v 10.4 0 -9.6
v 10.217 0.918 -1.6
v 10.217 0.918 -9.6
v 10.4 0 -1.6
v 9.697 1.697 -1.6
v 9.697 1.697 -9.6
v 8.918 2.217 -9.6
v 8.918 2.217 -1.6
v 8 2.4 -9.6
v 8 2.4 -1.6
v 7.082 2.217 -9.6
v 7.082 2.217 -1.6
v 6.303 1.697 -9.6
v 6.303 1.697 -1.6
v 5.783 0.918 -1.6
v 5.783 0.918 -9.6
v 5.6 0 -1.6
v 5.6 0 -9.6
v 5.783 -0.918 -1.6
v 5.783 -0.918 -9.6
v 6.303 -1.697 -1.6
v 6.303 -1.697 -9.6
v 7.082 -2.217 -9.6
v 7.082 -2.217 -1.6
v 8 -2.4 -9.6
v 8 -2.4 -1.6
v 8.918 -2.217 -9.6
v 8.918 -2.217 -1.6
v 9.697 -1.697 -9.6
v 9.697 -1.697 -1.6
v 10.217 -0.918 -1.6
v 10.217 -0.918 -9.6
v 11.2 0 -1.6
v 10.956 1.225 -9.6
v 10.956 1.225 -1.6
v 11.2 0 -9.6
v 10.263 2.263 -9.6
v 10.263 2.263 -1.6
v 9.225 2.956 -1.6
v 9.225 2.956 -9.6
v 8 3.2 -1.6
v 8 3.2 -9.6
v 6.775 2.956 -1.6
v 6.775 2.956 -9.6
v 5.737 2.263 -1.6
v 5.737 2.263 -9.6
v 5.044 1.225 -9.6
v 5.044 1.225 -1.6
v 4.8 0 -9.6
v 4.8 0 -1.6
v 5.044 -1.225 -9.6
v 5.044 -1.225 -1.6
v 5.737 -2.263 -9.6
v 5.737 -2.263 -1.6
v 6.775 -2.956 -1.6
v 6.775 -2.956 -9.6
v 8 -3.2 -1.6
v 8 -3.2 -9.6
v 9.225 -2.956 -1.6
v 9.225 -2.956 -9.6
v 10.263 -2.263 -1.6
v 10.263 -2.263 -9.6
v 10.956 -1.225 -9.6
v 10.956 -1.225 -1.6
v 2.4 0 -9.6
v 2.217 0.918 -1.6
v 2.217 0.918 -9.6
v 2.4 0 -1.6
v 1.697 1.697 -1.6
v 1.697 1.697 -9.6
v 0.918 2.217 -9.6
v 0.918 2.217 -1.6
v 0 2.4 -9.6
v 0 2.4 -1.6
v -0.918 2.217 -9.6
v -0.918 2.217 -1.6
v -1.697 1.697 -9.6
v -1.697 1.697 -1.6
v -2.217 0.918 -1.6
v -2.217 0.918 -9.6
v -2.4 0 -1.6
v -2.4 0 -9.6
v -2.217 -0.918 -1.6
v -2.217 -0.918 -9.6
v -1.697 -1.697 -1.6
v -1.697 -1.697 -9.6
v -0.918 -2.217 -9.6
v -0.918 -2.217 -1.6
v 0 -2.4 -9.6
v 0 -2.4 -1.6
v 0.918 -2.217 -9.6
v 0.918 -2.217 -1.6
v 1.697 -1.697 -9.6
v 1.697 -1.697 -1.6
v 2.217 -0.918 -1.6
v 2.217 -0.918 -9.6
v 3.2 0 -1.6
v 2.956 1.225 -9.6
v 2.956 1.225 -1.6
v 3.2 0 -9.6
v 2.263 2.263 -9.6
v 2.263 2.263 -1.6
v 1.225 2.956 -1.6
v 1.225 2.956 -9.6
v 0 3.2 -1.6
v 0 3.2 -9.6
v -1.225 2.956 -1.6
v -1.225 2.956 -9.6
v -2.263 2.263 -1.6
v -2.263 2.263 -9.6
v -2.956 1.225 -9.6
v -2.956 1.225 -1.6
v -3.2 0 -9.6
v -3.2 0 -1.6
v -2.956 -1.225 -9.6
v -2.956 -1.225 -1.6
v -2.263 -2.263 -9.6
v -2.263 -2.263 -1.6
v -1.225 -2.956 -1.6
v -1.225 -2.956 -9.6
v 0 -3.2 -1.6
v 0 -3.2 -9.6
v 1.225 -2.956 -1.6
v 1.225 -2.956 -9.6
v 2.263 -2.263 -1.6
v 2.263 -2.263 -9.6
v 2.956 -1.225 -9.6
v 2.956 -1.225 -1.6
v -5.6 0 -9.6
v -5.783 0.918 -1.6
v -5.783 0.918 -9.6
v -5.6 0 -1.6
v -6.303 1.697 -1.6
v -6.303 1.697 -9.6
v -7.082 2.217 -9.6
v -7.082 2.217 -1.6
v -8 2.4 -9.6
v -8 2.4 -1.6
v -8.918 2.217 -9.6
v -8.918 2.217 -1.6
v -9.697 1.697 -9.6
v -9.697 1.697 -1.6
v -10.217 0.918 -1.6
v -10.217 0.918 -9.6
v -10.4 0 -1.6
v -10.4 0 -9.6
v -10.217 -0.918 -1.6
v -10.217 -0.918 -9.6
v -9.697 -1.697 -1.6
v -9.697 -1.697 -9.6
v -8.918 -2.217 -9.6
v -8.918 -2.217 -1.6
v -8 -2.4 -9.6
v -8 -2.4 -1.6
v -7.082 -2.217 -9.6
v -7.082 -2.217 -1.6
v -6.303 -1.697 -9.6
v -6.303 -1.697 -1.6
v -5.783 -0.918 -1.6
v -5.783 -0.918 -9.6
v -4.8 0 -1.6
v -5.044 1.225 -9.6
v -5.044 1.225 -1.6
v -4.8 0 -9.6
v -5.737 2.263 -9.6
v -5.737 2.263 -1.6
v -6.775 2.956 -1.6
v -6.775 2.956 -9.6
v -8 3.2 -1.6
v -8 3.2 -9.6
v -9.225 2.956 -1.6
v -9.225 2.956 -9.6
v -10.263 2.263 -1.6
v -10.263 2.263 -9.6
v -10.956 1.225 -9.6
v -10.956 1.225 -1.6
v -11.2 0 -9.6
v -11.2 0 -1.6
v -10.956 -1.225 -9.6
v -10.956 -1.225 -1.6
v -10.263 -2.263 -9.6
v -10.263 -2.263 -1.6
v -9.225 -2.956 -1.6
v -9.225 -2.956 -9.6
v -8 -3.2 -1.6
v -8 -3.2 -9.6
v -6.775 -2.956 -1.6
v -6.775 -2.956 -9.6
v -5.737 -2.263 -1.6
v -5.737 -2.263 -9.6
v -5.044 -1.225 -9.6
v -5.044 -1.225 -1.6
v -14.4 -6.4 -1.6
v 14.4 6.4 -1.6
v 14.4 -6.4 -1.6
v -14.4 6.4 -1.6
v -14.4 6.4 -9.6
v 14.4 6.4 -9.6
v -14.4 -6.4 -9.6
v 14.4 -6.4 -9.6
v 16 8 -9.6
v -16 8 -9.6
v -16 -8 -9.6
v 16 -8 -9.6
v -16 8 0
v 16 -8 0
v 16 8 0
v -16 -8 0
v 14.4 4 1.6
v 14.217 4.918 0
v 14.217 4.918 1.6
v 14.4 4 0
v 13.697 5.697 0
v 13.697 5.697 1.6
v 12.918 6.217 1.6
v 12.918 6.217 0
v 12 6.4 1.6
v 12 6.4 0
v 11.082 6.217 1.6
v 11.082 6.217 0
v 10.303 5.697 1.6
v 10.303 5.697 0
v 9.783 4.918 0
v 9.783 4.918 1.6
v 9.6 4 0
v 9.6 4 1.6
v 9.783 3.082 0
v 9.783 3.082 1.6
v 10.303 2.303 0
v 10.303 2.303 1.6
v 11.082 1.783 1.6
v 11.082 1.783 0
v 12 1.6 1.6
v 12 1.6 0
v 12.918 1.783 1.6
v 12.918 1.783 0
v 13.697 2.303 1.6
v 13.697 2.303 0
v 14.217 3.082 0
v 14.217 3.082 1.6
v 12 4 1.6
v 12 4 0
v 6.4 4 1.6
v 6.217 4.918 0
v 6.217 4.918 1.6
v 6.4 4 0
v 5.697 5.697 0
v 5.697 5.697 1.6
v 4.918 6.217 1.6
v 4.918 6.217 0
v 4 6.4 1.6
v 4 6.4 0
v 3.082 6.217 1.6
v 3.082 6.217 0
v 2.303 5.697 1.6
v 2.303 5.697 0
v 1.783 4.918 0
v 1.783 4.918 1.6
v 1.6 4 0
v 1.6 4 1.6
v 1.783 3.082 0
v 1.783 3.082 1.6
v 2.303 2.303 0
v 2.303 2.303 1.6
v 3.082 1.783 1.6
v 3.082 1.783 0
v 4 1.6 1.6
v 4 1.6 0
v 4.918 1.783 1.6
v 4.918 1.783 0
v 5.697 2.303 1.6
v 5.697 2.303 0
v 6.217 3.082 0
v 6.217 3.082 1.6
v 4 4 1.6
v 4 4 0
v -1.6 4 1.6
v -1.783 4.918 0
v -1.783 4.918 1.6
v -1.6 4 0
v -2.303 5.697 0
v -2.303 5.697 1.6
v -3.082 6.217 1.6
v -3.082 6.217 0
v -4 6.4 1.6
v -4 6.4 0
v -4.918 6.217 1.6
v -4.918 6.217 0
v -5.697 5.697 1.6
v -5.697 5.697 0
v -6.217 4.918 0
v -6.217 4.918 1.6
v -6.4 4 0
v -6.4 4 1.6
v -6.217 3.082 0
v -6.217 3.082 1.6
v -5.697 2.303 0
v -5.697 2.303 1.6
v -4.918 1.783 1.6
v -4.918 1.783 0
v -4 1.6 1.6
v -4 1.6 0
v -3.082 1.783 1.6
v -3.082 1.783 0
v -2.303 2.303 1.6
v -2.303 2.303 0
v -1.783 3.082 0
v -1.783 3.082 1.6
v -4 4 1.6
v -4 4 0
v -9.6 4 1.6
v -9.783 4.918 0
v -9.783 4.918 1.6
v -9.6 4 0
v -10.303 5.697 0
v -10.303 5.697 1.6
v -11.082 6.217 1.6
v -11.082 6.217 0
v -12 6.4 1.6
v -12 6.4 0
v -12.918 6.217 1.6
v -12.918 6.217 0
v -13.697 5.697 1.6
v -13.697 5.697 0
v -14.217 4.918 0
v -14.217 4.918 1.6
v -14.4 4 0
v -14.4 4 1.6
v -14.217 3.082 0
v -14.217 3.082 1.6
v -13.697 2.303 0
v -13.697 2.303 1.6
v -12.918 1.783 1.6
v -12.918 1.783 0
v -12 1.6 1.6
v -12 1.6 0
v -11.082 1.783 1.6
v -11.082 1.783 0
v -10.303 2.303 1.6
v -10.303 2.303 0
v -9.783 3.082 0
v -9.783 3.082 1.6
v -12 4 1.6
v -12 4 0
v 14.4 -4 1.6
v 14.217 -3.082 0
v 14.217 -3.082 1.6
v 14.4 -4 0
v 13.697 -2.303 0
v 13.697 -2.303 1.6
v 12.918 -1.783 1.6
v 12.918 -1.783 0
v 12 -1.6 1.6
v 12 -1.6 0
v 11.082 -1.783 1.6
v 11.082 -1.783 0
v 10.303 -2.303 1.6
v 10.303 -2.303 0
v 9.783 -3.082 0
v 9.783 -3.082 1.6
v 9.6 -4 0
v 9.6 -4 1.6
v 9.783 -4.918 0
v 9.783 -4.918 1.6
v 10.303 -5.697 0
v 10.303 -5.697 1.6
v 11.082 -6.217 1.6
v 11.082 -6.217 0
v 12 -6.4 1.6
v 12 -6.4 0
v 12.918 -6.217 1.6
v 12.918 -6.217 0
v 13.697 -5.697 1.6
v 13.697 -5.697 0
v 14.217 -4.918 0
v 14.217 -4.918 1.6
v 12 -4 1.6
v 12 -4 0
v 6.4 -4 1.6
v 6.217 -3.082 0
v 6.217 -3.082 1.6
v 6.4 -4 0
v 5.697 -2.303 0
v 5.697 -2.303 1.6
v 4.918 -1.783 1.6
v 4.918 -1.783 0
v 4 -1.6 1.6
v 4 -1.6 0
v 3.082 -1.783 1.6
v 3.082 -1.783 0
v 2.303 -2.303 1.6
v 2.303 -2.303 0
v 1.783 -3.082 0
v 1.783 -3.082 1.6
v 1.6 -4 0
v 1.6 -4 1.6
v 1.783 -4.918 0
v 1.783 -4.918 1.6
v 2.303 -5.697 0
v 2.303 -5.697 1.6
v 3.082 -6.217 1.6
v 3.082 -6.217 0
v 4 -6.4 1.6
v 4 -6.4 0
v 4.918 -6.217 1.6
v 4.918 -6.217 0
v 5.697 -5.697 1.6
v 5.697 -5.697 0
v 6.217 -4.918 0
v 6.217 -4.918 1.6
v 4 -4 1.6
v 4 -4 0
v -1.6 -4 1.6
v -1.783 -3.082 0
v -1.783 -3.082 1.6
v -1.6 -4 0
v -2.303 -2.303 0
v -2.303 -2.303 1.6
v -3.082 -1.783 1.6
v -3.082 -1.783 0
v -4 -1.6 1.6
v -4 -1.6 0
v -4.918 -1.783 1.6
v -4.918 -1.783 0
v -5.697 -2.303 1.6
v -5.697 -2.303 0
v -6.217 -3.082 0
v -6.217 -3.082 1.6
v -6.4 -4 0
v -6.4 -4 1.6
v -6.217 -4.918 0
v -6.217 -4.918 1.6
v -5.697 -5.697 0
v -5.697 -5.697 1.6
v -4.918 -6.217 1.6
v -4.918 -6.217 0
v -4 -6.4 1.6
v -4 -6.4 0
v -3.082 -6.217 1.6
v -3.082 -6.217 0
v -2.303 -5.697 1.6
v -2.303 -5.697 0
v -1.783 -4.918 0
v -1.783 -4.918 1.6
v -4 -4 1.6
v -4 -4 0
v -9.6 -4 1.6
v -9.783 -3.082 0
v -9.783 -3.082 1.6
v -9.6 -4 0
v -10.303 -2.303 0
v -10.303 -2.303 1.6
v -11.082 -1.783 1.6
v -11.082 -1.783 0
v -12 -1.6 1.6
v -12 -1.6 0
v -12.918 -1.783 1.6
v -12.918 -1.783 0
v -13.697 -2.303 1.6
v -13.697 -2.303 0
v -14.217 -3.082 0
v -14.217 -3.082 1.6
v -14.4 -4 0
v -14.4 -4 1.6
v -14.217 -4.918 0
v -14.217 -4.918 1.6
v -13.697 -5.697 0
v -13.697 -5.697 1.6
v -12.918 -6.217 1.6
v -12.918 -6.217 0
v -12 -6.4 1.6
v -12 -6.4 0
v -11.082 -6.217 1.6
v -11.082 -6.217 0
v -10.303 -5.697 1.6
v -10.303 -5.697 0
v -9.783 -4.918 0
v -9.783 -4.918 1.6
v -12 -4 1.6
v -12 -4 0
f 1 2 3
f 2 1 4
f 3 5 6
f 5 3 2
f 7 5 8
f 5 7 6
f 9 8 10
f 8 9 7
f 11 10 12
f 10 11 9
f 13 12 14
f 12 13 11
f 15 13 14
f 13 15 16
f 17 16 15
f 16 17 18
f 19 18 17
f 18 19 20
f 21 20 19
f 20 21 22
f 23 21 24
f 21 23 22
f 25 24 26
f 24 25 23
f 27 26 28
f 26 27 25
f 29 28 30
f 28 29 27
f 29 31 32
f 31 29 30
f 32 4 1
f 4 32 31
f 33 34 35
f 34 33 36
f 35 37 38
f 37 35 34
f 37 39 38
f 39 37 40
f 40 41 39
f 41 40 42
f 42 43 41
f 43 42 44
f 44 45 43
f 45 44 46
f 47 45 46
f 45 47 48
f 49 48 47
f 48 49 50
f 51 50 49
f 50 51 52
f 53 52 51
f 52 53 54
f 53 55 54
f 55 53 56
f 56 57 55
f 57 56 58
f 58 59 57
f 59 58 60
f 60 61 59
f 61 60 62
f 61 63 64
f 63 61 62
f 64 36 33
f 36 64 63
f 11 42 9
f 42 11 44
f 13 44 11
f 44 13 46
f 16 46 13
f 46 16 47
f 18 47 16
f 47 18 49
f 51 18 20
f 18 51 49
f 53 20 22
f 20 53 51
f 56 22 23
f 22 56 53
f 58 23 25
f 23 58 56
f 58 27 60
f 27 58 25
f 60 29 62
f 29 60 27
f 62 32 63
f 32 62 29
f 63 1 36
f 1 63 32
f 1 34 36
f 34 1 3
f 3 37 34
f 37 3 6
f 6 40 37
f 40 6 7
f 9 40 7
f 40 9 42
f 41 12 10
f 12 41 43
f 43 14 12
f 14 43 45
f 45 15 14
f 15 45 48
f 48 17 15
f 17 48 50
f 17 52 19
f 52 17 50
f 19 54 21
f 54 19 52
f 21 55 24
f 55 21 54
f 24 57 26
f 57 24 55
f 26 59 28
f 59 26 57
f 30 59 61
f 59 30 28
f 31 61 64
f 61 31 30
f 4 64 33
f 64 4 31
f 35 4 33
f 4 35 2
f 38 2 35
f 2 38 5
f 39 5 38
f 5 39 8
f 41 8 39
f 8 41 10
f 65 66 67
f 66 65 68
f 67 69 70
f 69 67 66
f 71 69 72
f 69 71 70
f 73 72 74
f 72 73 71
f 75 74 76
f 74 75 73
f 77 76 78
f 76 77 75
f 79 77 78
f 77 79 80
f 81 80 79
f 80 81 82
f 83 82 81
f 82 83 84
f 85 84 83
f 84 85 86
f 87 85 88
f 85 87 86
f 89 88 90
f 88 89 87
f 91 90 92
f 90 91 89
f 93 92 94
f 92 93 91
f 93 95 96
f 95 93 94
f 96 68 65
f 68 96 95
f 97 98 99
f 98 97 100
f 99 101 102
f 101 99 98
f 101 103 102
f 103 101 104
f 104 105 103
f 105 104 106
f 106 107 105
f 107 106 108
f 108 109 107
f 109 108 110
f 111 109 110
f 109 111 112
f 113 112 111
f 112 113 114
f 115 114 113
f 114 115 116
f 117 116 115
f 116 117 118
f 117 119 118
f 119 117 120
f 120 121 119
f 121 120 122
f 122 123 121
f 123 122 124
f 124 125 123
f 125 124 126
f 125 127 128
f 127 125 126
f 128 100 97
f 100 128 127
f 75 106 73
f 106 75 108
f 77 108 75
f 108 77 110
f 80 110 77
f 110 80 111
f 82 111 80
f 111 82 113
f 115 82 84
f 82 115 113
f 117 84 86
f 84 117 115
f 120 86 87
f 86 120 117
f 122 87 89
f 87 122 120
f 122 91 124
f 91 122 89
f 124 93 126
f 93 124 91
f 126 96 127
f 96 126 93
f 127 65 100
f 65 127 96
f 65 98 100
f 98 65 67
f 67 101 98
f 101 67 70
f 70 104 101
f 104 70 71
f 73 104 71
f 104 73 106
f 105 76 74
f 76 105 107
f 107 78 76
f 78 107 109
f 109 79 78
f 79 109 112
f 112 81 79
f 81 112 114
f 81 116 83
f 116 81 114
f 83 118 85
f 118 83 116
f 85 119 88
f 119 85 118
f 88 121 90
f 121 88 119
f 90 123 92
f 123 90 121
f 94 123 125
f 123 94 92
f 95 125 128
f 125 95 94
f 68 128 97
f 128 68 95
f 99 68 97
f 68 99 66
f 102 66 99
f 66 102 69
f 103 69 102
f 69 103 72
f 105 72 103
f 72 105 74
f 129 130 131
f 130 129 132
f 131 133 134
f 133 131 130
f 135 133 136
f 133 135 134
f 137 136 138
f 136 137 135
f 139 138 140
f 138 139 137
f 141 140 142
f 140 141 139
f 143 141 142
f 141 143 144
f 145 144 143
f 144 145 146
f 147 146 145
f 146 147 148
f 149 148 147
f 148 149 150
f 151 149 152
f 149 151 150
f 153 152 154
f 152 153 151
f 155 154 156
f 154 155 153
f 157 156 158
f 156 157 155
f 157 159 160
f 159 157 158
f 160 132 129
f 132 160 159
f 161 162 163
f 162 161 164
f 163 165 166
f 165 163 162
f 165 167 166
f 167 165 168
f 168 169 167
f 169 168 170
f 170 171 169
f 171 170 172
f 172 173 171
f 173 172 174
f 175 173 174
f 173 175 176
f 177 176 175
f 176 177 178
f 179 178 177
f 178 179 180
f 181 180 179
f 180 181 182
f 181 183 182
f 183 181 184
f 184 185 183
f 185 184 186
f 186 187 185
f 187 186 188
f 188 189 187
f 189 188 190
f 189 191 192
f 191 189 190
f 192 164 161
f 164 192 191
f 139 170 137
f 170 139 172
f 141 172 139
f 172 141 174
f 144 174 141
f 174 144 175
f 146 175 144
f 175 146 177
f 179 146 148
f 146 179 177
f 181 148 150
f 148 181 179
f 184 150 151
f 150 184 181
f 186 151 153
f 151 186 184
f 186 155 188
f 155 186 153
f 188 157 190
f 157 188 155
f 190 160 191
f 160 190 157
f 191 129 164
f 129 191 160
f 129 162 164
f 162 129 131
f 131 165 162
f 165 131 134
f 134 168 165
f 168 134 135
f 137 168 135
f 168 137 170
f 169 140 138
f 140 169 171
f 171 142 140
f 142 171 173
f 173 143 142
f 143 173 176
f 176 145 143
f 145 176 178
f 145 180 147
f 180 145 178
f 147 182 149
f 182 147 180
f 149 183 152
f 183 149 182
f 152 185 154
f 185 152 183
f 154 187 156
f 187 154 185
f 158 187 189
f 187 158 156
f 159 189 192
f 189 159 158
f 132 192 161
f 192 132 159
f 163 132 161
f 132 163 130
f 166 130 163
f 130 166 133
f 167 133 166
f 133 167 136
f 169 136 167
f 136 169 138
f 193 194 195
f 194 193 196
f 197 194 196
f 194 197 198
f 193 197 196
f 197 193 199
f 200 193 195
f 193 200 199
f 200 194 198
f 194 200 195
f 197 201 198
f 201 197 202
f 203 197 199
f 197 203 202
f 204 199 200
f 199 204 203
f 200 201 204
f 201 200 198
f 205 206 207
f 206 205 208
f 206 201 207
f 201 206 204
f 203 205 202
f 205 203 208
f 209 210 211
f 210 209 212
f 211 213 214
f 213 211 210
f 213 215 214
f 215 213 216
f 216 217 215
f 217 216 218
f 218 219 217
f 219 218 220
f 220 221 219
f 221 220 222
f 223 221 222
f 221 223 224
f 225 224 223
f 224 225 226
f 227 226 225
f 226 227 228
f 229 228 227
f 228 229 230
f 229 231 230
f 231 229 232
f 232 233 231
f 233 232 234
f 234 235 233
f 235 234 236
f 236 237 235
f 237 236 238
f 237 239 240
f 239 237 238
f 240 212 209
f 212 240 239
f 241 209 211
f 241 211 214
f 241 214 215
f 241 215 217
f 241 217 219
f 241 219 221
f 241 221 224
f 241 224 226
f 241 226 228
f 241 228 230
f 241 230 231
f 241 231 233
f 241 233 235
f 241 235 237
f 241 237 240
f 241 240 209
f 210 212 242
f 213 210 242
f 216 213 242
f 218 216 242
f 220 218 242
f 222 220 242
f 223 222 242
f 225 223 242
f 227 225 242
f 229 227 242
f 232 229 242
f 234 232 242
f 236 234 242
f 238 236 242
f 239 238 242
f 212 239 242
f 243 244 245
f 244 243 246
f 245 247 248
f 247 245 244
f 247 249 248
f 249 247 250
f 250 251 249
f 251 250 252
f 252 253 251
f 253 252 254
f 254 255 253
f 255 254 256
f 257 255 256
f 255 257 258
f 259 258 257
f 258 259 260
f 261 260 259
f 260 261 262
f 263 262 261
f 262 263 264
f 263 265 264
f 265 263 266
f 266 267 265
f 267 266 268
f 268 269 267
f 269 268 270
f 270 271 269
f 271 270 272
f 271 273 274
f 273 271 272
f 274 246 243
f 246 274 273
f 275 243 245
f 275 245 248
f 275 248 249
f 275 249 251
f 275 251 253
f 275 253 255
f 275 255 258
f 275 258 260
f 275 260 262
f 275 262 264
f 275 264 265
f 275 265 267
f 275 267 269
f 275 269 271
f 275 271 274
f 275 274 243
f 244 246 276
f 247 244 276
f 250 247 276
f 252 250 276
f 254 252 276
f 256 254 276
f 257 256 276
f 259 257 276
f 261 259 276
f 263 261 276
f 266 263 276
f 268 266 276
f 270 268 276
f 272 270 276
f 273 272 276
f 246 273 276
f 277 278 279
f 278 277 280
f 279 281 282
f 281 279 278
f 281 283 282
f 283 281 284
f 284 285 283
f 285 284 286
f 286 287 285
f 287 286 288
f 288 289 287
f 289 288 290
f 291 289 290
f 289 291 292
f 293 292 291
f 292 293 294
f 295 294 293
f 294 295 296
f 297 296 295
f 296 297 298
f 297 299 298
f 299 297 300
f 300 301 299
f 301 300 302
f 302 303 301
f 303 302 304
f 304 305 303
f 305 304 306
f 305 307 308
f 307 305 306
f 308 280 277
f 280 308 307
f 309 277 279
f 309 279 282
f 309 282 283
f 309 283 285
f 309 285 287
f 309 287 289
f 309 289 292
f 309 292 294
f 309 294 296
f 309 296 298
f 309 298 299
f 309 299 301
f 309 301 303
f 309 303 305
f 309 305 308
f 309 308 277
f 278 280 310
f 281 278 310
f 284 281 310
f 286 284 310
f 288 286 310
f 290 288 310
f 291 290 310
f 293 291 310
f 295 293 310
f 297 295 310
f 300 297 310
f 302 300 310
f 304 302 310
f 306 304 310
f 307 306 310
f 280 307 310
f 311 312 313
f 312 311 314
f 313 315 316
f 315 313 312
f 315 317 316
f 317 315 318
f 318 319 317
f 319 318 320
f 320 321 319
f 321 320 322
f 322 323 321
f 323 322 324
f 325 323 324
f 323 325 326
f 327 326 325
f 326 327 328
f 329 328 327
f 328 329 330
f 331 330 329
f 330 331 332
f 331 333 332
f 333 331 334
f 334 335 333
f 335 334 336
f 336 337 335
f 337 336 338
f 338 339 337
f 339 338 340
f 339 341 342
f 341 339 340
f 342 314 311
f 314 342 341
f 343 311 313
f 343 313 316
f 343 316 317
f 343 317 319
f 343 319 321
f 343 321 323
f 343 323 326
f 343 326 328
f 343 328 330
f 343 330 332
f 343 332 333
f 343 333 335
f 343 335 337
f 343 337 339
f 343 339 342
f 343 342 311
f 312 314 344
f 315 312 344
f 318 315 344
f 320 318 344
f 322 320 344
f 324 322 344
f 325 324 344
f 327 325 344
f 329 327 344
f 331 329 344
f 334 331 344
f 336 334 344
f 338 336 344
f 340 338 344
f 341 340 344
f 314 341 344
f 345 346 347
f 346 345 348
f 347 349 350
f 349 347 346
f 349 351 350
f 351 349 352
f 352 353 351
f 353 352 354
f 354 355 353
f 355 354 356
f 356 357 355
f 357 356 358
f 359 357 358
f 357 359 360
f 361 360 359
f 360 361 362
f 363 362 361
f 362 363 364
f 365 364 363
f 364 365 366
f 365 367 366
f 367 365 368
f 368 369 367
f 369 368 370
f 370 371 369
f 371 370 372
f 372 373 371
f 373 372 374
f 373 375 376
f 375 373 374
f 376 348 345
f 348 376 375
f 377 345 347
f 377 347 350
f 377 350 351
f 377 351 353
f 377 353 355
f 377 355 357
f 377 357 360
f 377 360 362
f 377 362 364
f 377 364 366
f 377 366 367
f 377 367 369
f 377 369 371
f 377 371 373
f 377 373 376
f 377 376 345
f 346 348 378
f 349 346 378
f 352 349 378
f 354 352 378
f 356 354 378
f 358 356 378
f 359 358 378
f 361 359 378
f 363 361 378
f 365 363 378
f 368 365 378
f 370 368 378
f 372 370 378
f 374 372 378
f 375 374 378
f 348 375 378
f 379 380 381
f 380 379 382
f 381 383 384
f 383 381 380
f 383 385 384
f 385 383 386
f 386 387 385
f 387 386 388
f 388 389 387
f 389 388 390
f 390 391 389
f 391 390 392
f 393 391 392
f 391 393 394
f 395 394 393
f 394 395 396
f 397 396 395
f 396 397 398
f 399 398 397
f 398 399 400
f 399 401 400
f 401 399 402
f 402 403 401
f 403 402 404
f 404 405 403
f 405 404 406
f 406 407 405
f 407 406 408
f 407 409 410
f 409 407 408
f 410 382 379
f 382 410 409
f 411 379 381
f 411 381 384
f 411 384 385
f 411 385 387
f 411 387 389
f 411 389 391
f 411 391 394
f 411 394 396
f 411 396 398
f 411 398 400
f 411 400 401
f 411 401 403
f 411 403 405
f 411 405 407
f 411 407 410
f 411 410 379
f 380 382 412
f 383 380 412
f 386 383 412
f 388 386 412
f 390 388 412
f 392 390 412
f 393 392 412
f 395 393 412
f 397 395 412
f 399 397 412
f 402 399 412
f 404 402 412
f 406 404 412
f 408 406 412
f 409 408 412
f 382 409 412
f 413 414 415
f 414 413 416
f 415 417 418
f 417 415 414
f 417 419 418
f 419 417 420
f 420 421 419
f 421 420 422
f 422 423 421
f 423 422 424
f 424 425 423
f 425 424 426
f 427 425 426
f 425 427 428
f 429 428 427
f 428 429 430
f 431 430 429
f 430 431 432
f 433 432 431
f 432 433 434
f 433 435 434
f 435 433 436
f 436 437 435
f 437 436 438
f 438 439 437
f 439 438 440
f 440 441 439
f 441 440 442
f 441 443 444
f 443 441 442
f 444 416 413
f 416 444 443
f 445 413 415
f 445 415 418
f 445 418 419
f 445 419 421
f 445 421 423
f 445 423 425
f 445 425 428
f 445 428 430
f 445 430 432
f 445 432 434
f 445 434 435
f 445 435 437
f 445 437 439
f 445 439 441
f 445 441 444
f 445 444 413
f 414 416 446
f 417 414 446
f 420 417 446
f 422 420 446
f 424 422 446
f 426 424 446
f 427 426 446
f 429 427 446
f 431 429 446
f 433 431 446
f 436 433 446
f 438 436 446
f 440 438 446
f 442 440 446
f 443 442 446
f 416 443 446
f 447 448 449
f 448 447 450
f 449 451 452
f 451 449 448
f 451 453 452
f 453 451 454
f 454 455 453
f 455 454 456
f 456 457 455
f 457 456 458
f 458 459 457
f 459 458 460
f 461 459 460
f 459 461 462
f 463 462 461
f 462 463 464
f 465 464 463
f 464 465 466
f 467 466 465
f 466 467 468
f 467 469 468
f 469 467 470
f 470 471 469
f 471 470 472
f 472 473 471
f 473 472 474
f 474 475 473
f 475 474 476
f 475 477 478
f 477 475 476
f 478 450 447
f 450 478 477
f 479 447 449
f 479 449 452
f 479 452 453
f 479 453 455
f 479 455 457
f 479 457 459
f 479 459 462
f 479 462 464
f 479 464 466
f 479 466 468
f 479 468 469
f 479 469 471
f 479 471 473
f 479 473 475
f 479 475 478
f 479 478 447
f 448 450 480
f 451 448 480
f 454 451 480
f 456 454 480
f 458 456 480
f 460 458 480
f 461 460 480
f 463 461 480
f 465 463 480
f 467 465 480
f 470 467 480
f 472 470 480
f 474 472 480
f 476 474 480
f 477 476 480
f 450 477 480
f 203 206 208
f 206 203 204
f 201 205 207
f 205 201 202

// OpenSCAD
// file: ../p/4-4ring3.scad
use <../lib.scad>
$fa=1; $fs=0.2;
function ldraw_lib__4_4ring3(realsolid=false) = [
// 0 Ring  3 x 1.0
// 0 Name: 4-4ring3.dat
// 0 Author: James Jessiman
// 0 !LDRAW_ORG Primitive UPDATE 2009-01
// 0 !LICENSE Licensed under CC BY 2.0 and CC BY 4.0 : see CAreadme.txt
// 
// 0 BFC CERTIFY CCW
  [0,"BFC","CERTIFY"],
  [0,"BFC","CCW"],
// 
// 0 !HISTORY 1998-12-15 [PTadmin] Official Update 1998-10
// 0 !HISTORY 2002-04-05 [hafhead] Added BFC statement
// 0 !HISTORY 2002-04-25 [PTadmin] Official Update 2002-02
// 0 !HISTORY 2007-06-24 [PTadmin] Header formatted for Contributor Agreement
// 0 !HISTORY 2008-07-01 [PTadmin] Official Update 2008-01
// 0 !HISTORY 2008-08-26 [cwdee] Switch polygon winding and rename
// 0 !HISTORY 2009-05-02 [PTadmin] Official Update 2009-01
// 
// 
// 4 16 -1.5308 0 3.6956 -1.1481 0 2.7717 0 0 3 0 0 4
  [4,16,-1.5308,0,3.6956,-1.1481,0,2.7717,0,0,3,0,0,4],
// 4 16 -2.8284 0 2.8284 -2.1213 0 2.1213 -1.1481 0 2.7717 -1.5308 0 3.6956
  [4,16,-2.8284,0,2.8284,-2.1213,0,2.1213,-1.1481,0,2.7717,-1.5308,0,3.6956],
// 4 16 -3.6956 0 1.5308 -2.7717 0 1.1481 -2.1213 0 2.1213 -2.8284 0 2.8284
  [4,16,-3.6956,0,1.5308,-2.7717,0,1.1481,-2.1213,0,2.1213,-2.8284,0,2.8284],
// 4 16 -4 0 0 -3 0 0 -2.7717 0 1.1481 -3.6956 0 1.5308
  [4,16,-4,0,0,-3,0,0,-2.7717,0,1.1481,-3.6956,0,1.5308],
// 4 16 -3.6956 0 -1.5308 -2.7717 0 -1.1481 -3 0 0 -4 0 0
  [4,16,-3.6956,0,-1.5308,-2.7717,0,-1.1481,-3,0,0,-4,0,0],
// 4 16 -2.8284 0 -2.8284 -2.1213 0 -2.1213 -2.7717 0 -1.1481 -3.6956 0 -1.5308
  [4,16,-2.8284,0,-2.8284,-2.1213,0,-2.1213,-2.7717,0,-1.1481,-3.6956,0,-1.5308],
// 4 16 -1.5308 0 -3.6956 -1.1481 0 -2.7717 -2.1213 0 -2.1213 -2.8284 0 -2.8284
  [4,16,-1.5308,0,-3.6956,-1.1481,0,-2.7717,-2.1213,0,-2.1213,-2.8284,0,-2.8284],
// 4 16 0 0 -4 0 0 -3 -1.1481 0 -2.7717 -1.5308 0 -3.6956
  [4,16,0,0,-4,0,0,-3,-1.1481,0,-2.7717,-1.5308,0,-3.6956],
// 4 16 1.5308 0 -3.6956 1.1481 0 -2.7717 0 0 -3 0 0 -4
  [4,16,1.5308,0,-3.6956,1.1481,0,-2.7717,0,0,-3,0,0,-4],
// 4 16 2.8284 0 -2.8284 2.1213 0 -2.1213 1.1481 0 -2.7717 1.5308 0 -3.6956
  [4,16,2.8284,0,-2.8284,2.1213,0,-2.1213,1.1481,0,-2.7717,1.5308,0,-3.6956],
// 4 16 3.6956 0 -1.5308 2.7717 0 -1.1481 2.1213 0 -2.1213 2.8284 0 -2.8284
  [4,16,3.6956,0,-1.5308,2.7717,0,-1.1481,2.1213,0,-2.1213,2.8284,0,-2.8284],
// 4 16 4 0 0 3 0 0 2.7717 0 -1.1481 3.6956 0 -1.5308
  [4,16,4,0,0,3,0,0,2.7717,0,-1.1481,3.6956,0,-1.5308],
// 4 16 3.6956 0 1.5308 2.7717 0 1.1481 3 0 0 4 0 0
  [4,16,3.6956,0,1.5308,2.7717,0,1.1481,3,0,0,4,0,0],
// 4 16 2.8284 0 2.8284 2.1213 0 2.1213 2.7717 0 1.1481 3.6956 0 1.5308
  [4,16,2.8284,0,2.8284,2.1213,0,2.1213,2.7717,0,1.1481,3.6956,0,1.5308],
// 4 16 1.5308 0 3.6956 1.1481 0 2.7717 2.1213 0 2.1213 2.8284 0 2.8284
  [4,16,1.5308,0,3.6956,1.1481,0,2.7717,2.1213,0,2.1213,2.8284,0,2.8284],
// 4 16 0 0 4 0 0 3 1.1481 0 2.7717 1.5308 0 3.6956
  [4,16,0,0,4,0,0,3,1.1481,0,2.7717,1.5308,0,3.6956],
// 0
];
module ldraw_lib__4_4ring3(step=0, col=false, unit=2/5, alt=false, line=0.2, solid=!$preview)
    makepoly(ldraw_lib__4_4ring3(solid), step=step, col=col, unit=unit, alt=alt, line=line, solid=solid);
ldraw_lib__4_4ring3(line=0.2);
// file: ../p/4-4edge.scad
use <../lib.scad>
function ldraw_lib__4_4edge() = [
// 0 Circle 1.0
// 0 Name: 4-4edge.dat
// 0 Author: James Jessiman
// 0 !LDRAW_ORG Primitive UPDATE 2017-01
// 0 !LICENSE Licensed under CC BY 2.0 and CC BY 4.0 : see CAreadme.txt
// 
// 0 BFC CERTIFY CCW
  [0,"BFC","CERTIFY"],
  [0,"BFC","CCW"],
// 
// 0 !HISTORY 1998-12-15 [PTadmin] Official Update 1998-10
// 0 !HISTORY 2005-12-28 [PTadmin] Official Update 2005-01
// 0 !HISTORY 2007-06-24 [PTadmin] Header formatted for Contributor Agreement
// 0 !HISTORY 2008-07-01 [PTadmin] Official Update 2008-01
// 0 !HISTORY 2017-01-15 [Steffen] BFCed
// 0 !HISTORY 2017-12-30 [PTadmin] Official Update 2017-01
// 
// 
// 2 24 1 0 0 0.9239 0 0.3827
  [2,24,1,0,0,0.9239,0,0.3827],
// 2 24 0.9239 0 0.3827 0.7071 0 0.7071
  [2,24,0.9239,0,0.3827,0.7071,0,0.7071],
// 2 24 0.7071 0 0.7071 0.3827 0 0.9239
  [2,24,0.7071,0,0.7071,0.3827,0,0.9239],
// 2 24 0.3827 0 0.9239 0 0 1
  [2,24,0.3827,0,0.9239,0,0,1],
// 2 24 0 0 1 -0.3827 0 0.9239
  [2,24,0,0,1,-0.3827,0,0.9239],
// 2 24 -0.3827 0 0.9239 -0.7071 0 0.7071
  [2,24,-0.3827,0,0.9239,-0.7071,0,0.7071],
// 2 24 -0.7071 0 0.7071 -0.9239 0 0.3827
  [2,24,-0.7071,0,0.7071,-0.9239,0,0.3827],
// 2 24 -0.9239 0 0.3827 -1 0 -0
  [2,24,-0.9239,0,0.3827,-1,0,-0],
// 2 24 -1 0 -0 -0.9239 0 -0.3827
  [2,24,-1,0,-0,-0.9239,0,-0.3827],
// 2 24 -0.9239 0 -0.3827 -0.7071 0 -0.7071
  [2,24,-0.9239,0,-0.3827,-0.7071,0,-0.7071],
// 2 24 -0.7071 0 -0.7071 -0.3827 0 -0.9239
  [2,24,-0.7071,0,-0.7071,-0.3827,0,-0.9239],
// 2 24 -0.3827 0 -0.9239 0 0 -1
  [2,24,-0.3827,0,-0.9239,0,0,-1],
// 2 24 0 0 -1 0.3827 0 -0.9239
  [2,24,0,0,-1,0.3827,0,-0.9239],
// 2 24 0.3827 0 -0.9239 0.7071 0 -0.7071
  [2,24,0.3827,0,-0.9239,0.7071,0,-0.7071],
// 2 24 0.7071 0 -0.7071 0.9239 0 -0.3827
  [2,24,0.7071,0,-0.7071,0.9239,0,-0.3827],
// 2 24 0.9239 0 -0.3827 1 0 0
  [2,24,0.9239,0,-0.3827,1,0,0],
];
module ldraw_lib__4_4edge(step=0, col=false, unit=2/5, alt=false, line=0.2, solid=!$preview)
    makepoly(ldraw_lib__4_4edge(), step=step, col=col, unit=unit, alt=alt, line=line, solid=solid);
ldraw_lib__4_4edge(line=0.2);
// file: ../p/4-4disc.scad
use <../lib.scad>
function ldraw_lib__4_4disc() = [
// 0 Disc 1.0
// 0 Name: 4-4disc.dat
// 0 Author: James Jessiman
// 0 !LDRAW_ORG Primitive UPDATE 2002-02
// 0 !LICENSE Licensed under CC BY 2.0 and CC BY 4.0 : see CAreadme.txt
// 
// 0 BFC CERTIFY CCW
  [0,"BFC","CERTIFY"],
  [0,"BFC","CCW"],
// 
// 0 !HISTORY 1998-12-15 [PTadmin] Official Update 1998-10
// 0 !HISTORY 2002-03-23 [sbliss] Added BFC statement
// 0 !HISTORY 2002-04-25 [PTadmin] Official Update 2002-02
// 0 !HISTORY 2007-06-24 [PTadmin] Header formatted for Contributor Agreement
// 0 !HISTORY 2008-07-01 [PTadmin] Official Update 2008-01
// 
// 
// 3 16 0 0 0 1 0 0 0.9239 0 0.3827
  [3,16,0,0,0,1,0,0,0.9239,0,0.3827],
// 3 16 0 0 0 0.9239 0 0.3827 0.7071 0 0.7071
  [3,16,0,0,0,0.9239,0,0.3827,0.7071,0,0.7071],
// 3 16 0 0 0 0.7071 0 0.7071 0.3827 0 0.9239
  [3,16,0,0,0,0.7071,0,0.7071,0.3827,0,0.9239],
// 3 16 0 0 0 0.3827 0 0.9239 0 0 1
  [3,16,0,0,0,0.3827,0,0.9239,0,0,1],
// 3 16 0 0 0 0 0 1 -0.3827 0 0.9239
  [3,16,0,0,0,0,0,1,-0.3827,0,0.9239],
// 3 16 0 0 0 -0.3827 0 0.9239 -0.7071 0 0.7071
  [3,16,0,0,0,-0.3827,0,0.9239,-0.7071,0,0.7071],
// 3 16 0 0 0 -0.7071 0 0.7071 -0.9239 0 0.3827
  [3,16,0,0,0,-0.7071,0,0.7071,-0.9239,0,0.3827],
// 3 16 0 0 0 -0.9239 0 0.3827 -1 0 -0
  [3,16,0,0,0,-0.9239,0,0.3827,-1,0,-0],
// 3 16 0 0 0 -1 0 -0 -0.9239 0 -0.3827
  [3,16,0,0,0,-1,0,-0,-0.9239,0,-0.3827],
// 3 16 0 0 0 -0.9239 0 -0.3827 -0.7071 0 -0.7071
  [3,16,0,0,0,-0.9239,0,-0.3827,-0.7071,0,-0.7071],
// 3 16 0 0 0 -0.7071 0 -0.7071 -0.3827 0 -0.9239
  [3,16,0,0,0,-0.7071,0,-0.7071,-0.3827,0,-0.9239],
// 3 16 0 0 0 -0.3827 0 -0.9239 0 0 -1
  [3,16,0,0,0,-0.3827,0,-0.9239,0,0,-1],
// 3 16 0 0 0 0 0 -1 0.3827 0 -0.9239
  [3,16,0,0,0,0,0,-1,0.3827,0,-0.9239],
// 3 16 0 0 0 0.3827 0 -0.9239 0.7071 0 -0.7071
  [3,16,0,0,0,0.3827,0,-0.9239,0.7071,0,-0.7071],
// 3 16 0 0 0 0.7071 0 -0.7071 0.9239 0 -0.3827
  [3,16,0,0,0,0.7071,0,-0.7071,0.9239,0,-0.3827],
// 3 16 0 0 0 0.9239 0 -0.3827 1 0 0
  [3,16,0,0,0,0.9239,0,-0.3827,1,0,0],
// 0
];
module ldraw_lib__4_4disc(step=0, col=false, unit=2/5, alt=false, line=0.2, solid=!$preview)
    makepoly(ldraw_lib__4_4disc(), step=step, col=col, unit=unit, alt=alt, line=line, solid=solid);
ldraw_lib__4_4disc(line=0.2);
// file: ../p/4-4cyli.scad
use <../lib.scad>
$fa=1; $fs=0.2;
function ldraw_lib__4_4cyli(realsolid=false) = [
// 0 Cylinder 1.0
// 0 Name: 4-4cyli.dat
// 0 Author: James Jessiman
// 0 !LDRAW_ORG Primitive UPDATE 2005-01
// 0 !LICENSE Licensed under CC BY 2.0 and CC BY 4.0 : see CAreadme.txt
// 
// 0 BFC CERTIFY CCW
  [0,"BFC","CERTIFY"],
  [0,"BFC","CCW"],
// 
// 0 !HISTORY 1998-12-15 [PTadmin] Official Update 1998-10
// 0 !HISTORY 2002-03-23 [sbliss] Added BFC statement; merged headers from files in distributions LDraw 0.27 and Complete.
// 0 !HISTORY 2002-04-25 [PTadmin] Official Update 2002-02
// 0 !HISTORY 2004-12-14 [guyvivan] BFC CCW
// 0 !HISTORY 2005-12-28 [PTadmin] Official Update 2005-01
// 0 !HISTORY 2007-06-24 [PTadmin] Header formatted for Contributor Agreement
// 0 !HISTORY 2008-07-01 [PTadmin] Official Update 2008-01
// 
// 
// 4 16 1 1 0 0.9239 1 0.3827 0.9239 0 0.3827 1 0 0
  [4,16,1,1,0,0.9239,1,0.3827,0.9239,0,0.3827,1,0,0],
// 5 24 1 0 0 1 1 0 0.9239 0 0.3827 0.9239 0 -0.3827
  [5,24,1,0,0,1,1,0,0.9239,0,0.3827,0.9239,0,-0.3827],
// 4 16 0.9239 1 0.3827 0.7071 1 0.7071 0.7071 0 0.7071 0.9239 0 0.3827
  [4,16,0.9239,1,0.3827,0.7071,1,0.7071,0.7071,0,0.7071,0.9239,0,0.3827],
// 5 24 0.9239 0 0.3827 0.9239 1 0.3827 0.7071 0 0.7071 1 0 0
  [5,24,0.9239,0,0.3827,0.9239,1,0.3827,0.7071,0,0.7071,1,0,0],
// 4 16 0.7071 1 0.7071 0.3827 1 0.9239 0.3827 0 0.9239 0.7071 0 0.7071
  [4,16,0.7071,1,0.7071,0.3827,1,0.9239,0.3827,0,0.9239,0.7071,0,0.7071],
// 5 24 0.7071 0 0.7071 0.7071 1 0.7071 0.3827 0 0.9239 0.9239 0 0.3827
  [5,24,0.7071,0,0.7071,0.7071,1,0.7071,0.3827,0,0.9239,0.9239,0,0.3827],
// 4 16 0.3827 1 0.9239 0 1 1 0 0 1 0.3827 0 0.9239
  [4,16,0.3827,1,0.9239,0,1,1,0,0,1,0.3827,0,0.9239],
// 5 24 0.3827 0 0.9239 0.3827 1 0.9239 0 0 1 0.7071 0 0.7071
  [5,24,0.3827,0,0.9239,0.3827,1,0.9239,0,0,1,0.7071,0,0.7071],
// 4 16 0 1 1 -0.3827 1 0.9239 -0.3827 0 0.9239 0 0 1
  [4,16,0,1,1,-0.3827,1,0.9239,-0.3827,0,0.9239,0,0,1],
// 5 24 0 0 1 0 1 1 -0.3827 0 0.9239 0.3827 0 0.9239
  [5,24,0,0,1,0,1,1,-0.3827,0,0.9239,0.3827,0,0.9239],
// 4 16 -0.3827 1 0.9239 -0.7071 1 0.7071 -0.7071 0 0.7071 -0.3827 0 0.9239
  [4,16,-0.3827,1,0.9239,-0.7071,1,0.7071,-0.7071,0,0.7071,-0.3827,0,0.9239],
// 5 24 -0.3827 0 0.9239 -0.3827 1 0.9239 -0.7071 0 0.7071 0 0 1
  [5,24,-0.3827,0,0.9239,-0.3827,1,0.9239,-0.7071,0,0.7071,0,0,1],
// 4 16 -0.7071 1 0.7071 -0.9239 1 0.3827 -0.9239 0 0.3827 -0.7071 0 0.7071
  [4,16,-0.7071,1,0.7071,-0.9239,1,0.3827,-0.9239,0,0.3827,-0.7071,0,0.7071],
// 5 24 -0.7071 0 0.7071 -0.7071 1 0.7071 -0.9239 0 0.3827 -0.3827 0 0.9239
  [5,24,-0.7071,0,0.7071,-0.7071,1,0.7071,-0.9239,0,0.3827,-0.3827,0,0.9239],
// 4 16 -0.9239 1 0.3827 -1 1 0 -1 0 0 -0.9239 0 0.3827
  [4,16,-0.9239,1,0.3827,-1,1,0,-1,0,0,-0.9239,0,0.3827],
// 5 24 -0.9239 0 0.3827 -0.9239 1 0.3827 -1 0 0 -0.7071 0 0.7071
  [5,24,-0.9239,0,0.3827,-0.9239,1,0.3827,-1,0,0,-0.7071,0,0.7071],
// 4 16 -1 1 0 -0.9239 1 -0.3827 -0.9239 0 -0.3827 -1 0 0
  [4,16,-1,1,0,-0.9239,1,-0.3827,-0.9239,0,-0.3827,-1,0,0],
// 5 24 -1 0 0 -1 1 0 -0.9239 0 -0.3827 -0.9239 0 0.3827
  [5,24,-1,0,0,-1,1,0,-0.9239,0,-0.3827,-0.9239,0,0.3827],
// 4 16 -0.9239 1 -0.3827 -0.7071 1 -0.7071 -0.7071 0 -0.7071 -0.9239 0 -0.3827
  [4,16,-0.9239,1,-0.3827,-0.7071,1,-0.7071,-0.7071,0,-0.7071,-0.9239,0,-0.3827],
// 5 24 -0.9239 0 -0.3827 -0.9239 1 -0.3827 -0.7071 0 -0.7071 -1 0 0
  [5,24,-0.9239,0,-0.3827,-0.9239,1,-0.3827,-0.7071,0,-0.7071,-1,0,0],
// 4 16 -0.7071 1 -0.7071 -0.3827 1 -0.9239 -0.3827 0 -0.9239 -0.7071 0 -0.7071
  [4,16,-0.7071,1,-0.7071,-0.3827,1,-0.9239,-0.3827,0,-0.9239,-0.7071,0,-0.7071],
// 5 24 -0.7071 0 -0.7071 -0.7071 1 -0.7071 -0.3827 0 -0.9239 -0.9239 0 -0.3827
  [5,24,-0.7071,0,-0.7071,-0.7071,1,-0.7071,-0.3827,0,-0.9239,-0.9239,0,-0.3827],
// 4 16 -0.3827 1 -0.9239 0 1 -1 0 0 -1 -0.3827 0 -0.9239
  [4,16,-0.3827,1,-0.9239,0,1,-1,0,0,-1,-0.3827,0,-0.9239],
// 5 24 -0.3827 0 -0.9239 -0.3827 1 -0.9239 0 0 -1 -0.7071 0 -0.7071
  [5,24,-0.3827,0,-0.9239,-0.3827,1,-0.9239,0,0,-1,-0.7071,0,-0.7071],
// 4 16 0 1 -1 0.3827 1 -0.9239 0.3827 0 -0.9239 0 0 -1
  [4,16,0,1,-1,0.3827,1,-0.9239,0.3827,0,-0.9239,0,0,-1],
// 5 24 0 0 -1 0 1 -1 0.3827 0 -0.9239 -0.3827 0 -0.9239
  [5,24,0,0,-1,0,1,-1,0.3827,0,-0.9239,-0.3827,0,-0.9239],
// 4 16 0.3827 1 -0.9239 0.7071 1 -0.7071 0.7071 0 -0.7071 0.3827 0 -0.9239
  [4,16,0.3827,1,-0.9239,0.7071,1,-0.7071,0.7071,0,-0.7071,0.3827,0,-0.9239],
// 5 24 0.3827 0 -0.9239 0.3827 1 -0.9239 0.7071 0 -0.7071 0 0 -1
  [5,24,0.3827,0,-0.9239,0.3827,1,-0.9239,0.7071,0,-0.7071,0,0,-1],
// 4 16 0.7071 1 -0.7071 0.9239 1 -0.3827 0.9239 0 -0.3827 0.7071 0 -0.7071
  [4,16,0.7071,1,-0.7071,0.9239,1,-0.3827,0.9239,0,-0.3827,0.7071,0,-0.7071],
// 5 24 0.7071 0 -0.7071 0.7071 1 -0.7071 0.9239 0 -0.3827 0.3827 0 -0.9239
  [5,24,0.7071,0,-0.7071,0.7071,1,-0.7071,0.9239,0,-0.3827,0.3827,0,-0.9239],
// 4 16 0.9239 1 -0.3827 1 1 0 1 0 0 0.9239 0 -0.3827
  [4,16,0.9239,1,-0.3827,1,1,0,1,0,0,0.9239,0,-0.3827],
// 5 24 0.9239 0 -0.3827 0.9239 1 -0.3827 1 0 0 0.7071 0 -0.7071
  [5,24,0.9239,0,-0.3827,0.9239,1,-0.3827,1,0,0,0.7071,0,-0.7071],
// 0
];
module ldraw_lib__4_4cyli(step=0, col=false, unit=2/5, alt=false, line=0.2, solid=!$preview)
    makepoly(ldraw_lib__4_4cyli(solid), step=step, col=col, unit=unit, alt=alt, line=line, solid=solid);
ldraw_lib__4_4cyli(line=0.2);
// file: ../p/stud4.scad
use <../lib.scad>
use <4-4cyli.scad>
use <4-4edge.scad>
use <4-4ring3.scad>
function ldraw_lib__stud4() = [
// 0 Stud Tube Open
// 0 Name: stud4.dat
// 0 Author: James Jessiman
// 0 !LDRAW_ORG Primitive UPDATE 2009-02
// 0 !LICENSE Licensed under CC BY 4.0 : see CAreadme.txt
// 
// 0 BFC CERTIFY CCW
  [0,"BFC","CERTIFY"],
  [0,"BFC","CCW"],
// 
// 0 !HISTORY 1999-07-05 [PTadmin] Official Update 1999-05
// 0 !HISTORY 2002-04-04 [sbliss] Modified for BFC compliance
// 0 !HISTORY 2002-04-25 [PTadmin] Official Update 2002-02
// 0 !HISTORY 2007-06-24 [PTadmin] Header formatted for Contributor Agreement
// 0 !HISTORY 2008-07-01 [PTadmin] Official Update 2008-01
// 0 !HISTORY 2009-06-21 [cwdee] Update ring references to 4-4ring
// 0 !HISTORY 2009-09-03 [PTadmin] Official Update 2009-02
// 
// 
// 1 16 0 -4 0 6 0 0 0 1 0 0 0 6 4-4edge.dat
  [1,16,0,-4,0,6,0,0,0,1,0,0,0,6, ldraw_lib__4_4edge()],
// 1 16 0 -4 0 8 0 0 0 1 0 0 0 8 4-4edge.dat
  [1,16,0,-4,0,8,0,0,0,1,0,0,0,8, ldraw_lib__4_4edge()],
// 1 16 0 0 0 6 0 0 0 1 0 0 0 6 4-4edge.dat
  [1,16,0,0,0,6,0,0,0,1,0,0,0,6, ldraw_lib__4_4edge()],
// 1 16 0 0 0 8 0 0 0 1 0 0 0 8 4-4edge.dat
  [1,16,0,0,0,8,0,0,0,1,0,0,0,8, ldraw_lib__4_4edge()],
// 0 BFC INVERTNEXT
  [0,"BFC","INVERTNEXT"],
// 1 16 0 -4 0 6 0 0 0 4 0 0 0 6 4-4cyli.dat
  [1,16,0,-4,0,6,0,0,0,4,0,0,0,6, ldraw_lib__4_4cyli()],
// 1 16 0 -4 0 8 0 0 0 4 0 0 0 8 4-4cyli.dat
  [1,16,0,-4,0,8,0,0,0,4,0,0,0,8, ldraw_lib__4_4cyli()],
// 1 16 0 -4 0 2 0 0 0 1 0 0 0 2 4-4ring3.dat
  [1,16,0,-4,0,2,0,0,0,1,0,0,0,2, ldraw_lib__4_4ring3()],
  [-1,16,0,0,0,2,0,0,0,-1,0,0,0,2, ldraw_lib__4_4ring3()],
// 0
];
module ldraw_lib__stud4(step=0, col=false, unit=2/5, alt=false, line=0.2, solid=!$preview)
    makepoly(ldraw_lib__stud4(), step=step, col=col, unit=unit, alt=alt, line=line, solid=solid);
ldraw_lib__stud4(line=0.2);
// file: ../p/stud.scad
use <../lib.scad>
use <4-4cyli.scad>
use <4-4disc.scad>
use <4-4edge.scad>
function ldraw_lib__stud() = [
// 0 Stud
// 0 Name: stud.dat
// 0 Author: James Jessiman
// 0 !LDRAW_ORG Primitive UPDATE 2012-01
// 0 !LICENSE Licensed under CC BY 4.0 : see CAreadme.txt
// 
// 0 BFC CERTIFY CCW
  [0,"BFC","CERTIFY"],
  [0,"BFC","CCW"],
// 
// 0 !HISTORY 2002-04-04 [sbliss] Modified for BFC compliance
// 0 !HISTORY 2002-04-25 [PTadmin] Official Update 2002-02
// 0 !HISTORY 2007-06-24 [PTadmin] Header formatted for Contributor Agreement
// 0 !HISTORY 2008-07-01 [PTadmin] Official Update 2008-01
// 0 !HISTORY 2012-02-16 [Philo] Changed to CCW
// 0 !HISTORY 2012-03-30 [PTadmin] Official Update 2012-01
// 
// 
// 1 16 0 0 0 6 0 0 0 1 0 0 0 6 4-4edge.dat
  [1,16,0,0,0,6,0,0,0,1,0,0,0,6, ldraw_lib__4_4edge()],
// 1 16 0 -4 0 6 0 0 0 1 0 0 0 6 4-4edge.dat
  [1,16,0,-4,0,6,0,0,0,1,0,0,0,6, ldraw_lib__4_4edge()],
// 1 16 0 0 0 6 0 0 0 -4 0 0 0 6 4-4cyli.dat
  [1,16,0,0,0,6,0,0,0,-4,0,0,0,6, ldraw_lib__4_4cyli()],
// 1 16 0 -4 0 6 0 0 0 1 0 0 0 6 4-4disc.dat
  [1,16,0,-4,0,6,0,0,0,1,0,0,0,6, ldraw_lib__4_4disc()],
  [-1,16,0,0,0,6,0,0,0,-1,0,0,0,6, ldraw_lib__4_4disc()],
];
module ldraw_lib__stud(step=0, col=false, unit=2/5, alt=false, line=0.2, solid=!$preview)
    makepoly(ldraw_lib__stud(), step=step, col=col, unit=unit, alt=alt, line=line, solid=solid);
ldraw_lib__stud(line=0.2);
// file: ../p/box5.scad
use <../lib.scad>
function ldraw_lib__box5() = [
// 0 Box with 5 Faces and All Edges
// 0 Name: box5.dat
// 0 Author: James Jessiman
// 0 !LDRAW_ORG Primitive UPDATE 2012-01
// 0 !LICENSE Licensed under CC BY 2.0 and CC BY 4.0 : see CAreadme.txt
// 
// 0 BFC CERTIFY CCW
  [0,"BFC","CERTIFY"],
  [0,"BFC","CCW"],
// 
// 0 !HISTORY 2002-04-03 [sbliss] Modified for BFC compliance
// 0 !HISTORY 2002-04-25 [PTadmin] Official Update 2002-02
// 0 !HISTORY 2007-06-24 [PTadmin] Header formatted for Contributor Agreement
// 0 !HISTORY 2008-07-01 [PTadmin] Official Update 2008-01
// 0 !HISTORY 2012-02-16 [Philo] Changed to CCW
// 0 !HISTORY 2012-03-30 [PTadmin] Official Update 2012-01
// 
// 
// 2 24 1 1 1 -1 1 1
  [2,24,1,1,1,-1,1,1],
// 2 24 -1 1 1 -1 1 -1
  [2,24,-1,1,1,-1,1,-1],
// 2 24 -1 1 -1 1 1 -1
  [2,24,-1,1,-1,1,1,-1],
// 2 24 1 1 -1 1 1 1
  [2,24,1,1,-1,1,1,1],
// 2 24 1 0 1 -1 0 1
  [2,24,1,0,1,-1,0,1],
// 2 24 -1 0 1 -1 0 -1
  [2,24,-1,0,1,-1,0,-1],
// 2 24 -1 0 -1 1 0 -1
  [2,24,-1,0,-1,1,0,-1],
// 2 24 1 0 -1 1 0 1
  [2,24,1,0,-1,1,0,1],
// 2 24 1 0 1 1 1 1
  [2,24,1,0,1,1,1,1],
// 2 24 -1 0 1 -1 1 1
  [2,24,-1,0,1,-1,1,1],
// 2 24 1 0 -1 1 1 -1
  [2,24,1,0,-1,1,1,-1],
// 2 24 -1 0 -1 -1 1 -1
  [2,24,-1,0,-1,-1,1,-1],
// 4 16 -1 1 1 1 1 1 1 1 -1 -1 1 -1
  [4,16,-1,1,1,1,1,1,1,1,-1,-1,1,-1],
// 4 16 -1 1 1 -1 0 1 1 0 1 1 1 1
  [4,16,-1,1,1,-1,0,1,1,0,1,1,1,1],
// 4 16 -1 1 -1 -1 0 -1 -1 0 1 -1 1 1
  [4,16,-1,1,-1,-1,0,-1,-1,0,1,-1,1,1],
// 4 16 1 1 -1 1 0 -1 -1 0 -1 -1 1 -1
  [4,16,1,1,-1,1,0,-1,-1,0,-1,-1,1,-1],
// 4 16 1 1 1 1 0 1 1 0 -1 1 1 -1
  [4,16,1,1,1,1,0,1,1,0,-1,1,1,-1],
];
makepoly(ldraw_lib__box5(), line=0.2);
// file: ../p/box3u2p.scad
use <../lib.scad>
function ldraw_lib__box3u2p() = [
// 0 Box with 3 Faces without 2 Parallel Edges
// 0 Name: box3u2p.dat
// 0 Author: Niels Karsdorp [nielsk]
// 0 !LDRAW_ORG Primitive UPDATE 2012-01
// 0 !LICENSE Licensed under CC BY 2.0 and CC BY 4.0 : see CAreadme.txt
// 
// 0 BFC CERTIFY CCW
  [0,"BFC","CERTIFY"],
  [0,"BFC","CCW"],
// 
// 0 !HISTORY 2003-03-12 [PTadmin] Official Update 2003-01
// 0 !HISTORY 2007-06-24 [PTadmin] Header formatted for Contributor Agreement
// 0 !HISTORY 2008-07-01 [PTadmin] Official Update 2008-01
// 0 !HISTORY 2012-02-16 [Philo] Changed to CCW
// 0 !HISTORY 2012-03-30 [PTadmin] Official Update 2012-01
// 
// 
// 2 24 1 1 1 -1 1 1
  [2,24,1,1,1,-1,1,1],
// 2 24 -1 1 -1 1 1 -1
  [2,24,-1,1,-1,1,1,-1],
// 2 24 1 0 1 -1 0 1
  [2,24,1,0,1,-1,0,1],
// 2 24 -1 0 -1 1 0 -1
  [2,24,-1,0,-1,1,0,-1],
// 2 24 1 1 1 1 1 -1
  [2,24,1,1,1,1,1,-1],
// 2 24 -1 1 1 -1 1 -1
  [2,24,-1,1,1,-1,1,-1],
// 2 24 1 1 1 1 0 1
  [2,24,1,1,1,1,0,1],
// 2 24 1 1 -1 1 0 -1
  [2,24,1,1,-1,1,0,-1],
// 2 24 -1 1 1 -1 0 1
  [2,24,-1,1,1,-1,0,1],
// 2 24 -1 1 -1 -1 0 -1
  [2,24,-1,1,-1,-1,0,-1],
// 4 16 -1 1 -1 -1 1 1 1 1 1 1 1 -1
  [4,16,-1,1,-1,-1,1,1,1,1,1,1,1,-1],
// 4 16 -1 1 1 -1 0 1 1 0 1 1 1 1
  [4,16,-1,1,1,-1,0,1,1,0,1,1,1,1],
// 4 16 1 1 -1 1 0 -1 -1 0 -1 -1 1 -1
  [4,16,1,1,-1,1,0,-1,-1,0,-1,-1,1,-1],
];
module ldraw_lib__box3u2p(step=0, col=false, unit=2/5, alt=false, line=0.2, solid=!$preview)
    makepoly(ldraw_lib__box3u2p(), step=step, col=col, unit=unit, alt=alt, line=line, solid=solid);
ldraw_lib__box3u2p(line=0.2);
// file: s/3001s01.scad
use <../../lib.scad>
use <../../p/box3u2p.scad>
use <../../p/box5.scad>
use <../../p/stud.scad>
use <../../p/stud4.scad>
$fa=1; $fs=0.2;
function ldraw_lib__s__3001s01(realsolid=false) = [
// 0 ~Brick  2 x  4 without Front and Back Faces
// 0 Name: s\3001s01.dat
// 0 Author: James Jessiman
// 0 !LDRAW_ORG Subpart UPDATE 2004-03
// 0 !LICENSE Licensed under CC BY 2.0 and CC BY 4.0 : see CAreadme.txt
// 
// 0 BFC CERTIFY CCW
  [0,"BFC","CERTIFY"],
  [0,"BFC","CCW"],
// 
// 0 !HISTORY 2002-05-07 {unknown} BFC certification
// 0 !HISTORY 2002-05-07 [westrate] Unknown change
// 0 !HISTORY 2004-09-15 [PTadmin] Official Update 2004-03
// 0 !HISTORY 2007-08-29 [PTadmin] Header formatted for Contributor Agreement
// 0 !HISTORY 2008-07-01 [PTadmin] Official Update 2008-01
// 
// 
// 0 // Uncomment for front and back faces:
// 0 // 4 16 40 0 -20 -40 0 -20 -40 24 -20 40 24 -20
// 0 // 4 16 40 0 20 -40 0 20 -40 24 20 40 24
// 
// 1 16 20 4 0 1 0 0 0 -5 0 0 0 1 stud4.dat
  [1,16,20,4,0,1,0,0,0,-5,0,0,0,1, ldraw_lib__stud4(realsolid)],
// 1 16 0 4 0 1 0 0 0 -5 0 0 0 1 stud4.dat
  [1,16,0,4,0,1,0,0,0,-5,0,0,0,1, ldraw_lib__stud4(realsolid)],
// 1 16 -20 4 0 1 0 0 0 -5 0 0 0 1 stud4.dat
  [1,16,-20,4,0,1,0,0,0,-5,0,0,0,1, ldraw_lib__stud4(realsolid)],
// 0 BFC INVERTNEXT
  [0,"BFC","INVERTNEXT"],
// 1 16 0 24 0 36 0 0 0 -20 0 0 0 16 box5.dat
  [1,16,0,24,0,36,0,0,0,-20,0,0,0,16, ldraw_lib__box5(realsolid)],
// 4 16 40 24 20 36 24 16 -36 24 16 -40 24 20
  [4,16,40,24,20,36,24,16,-36,24,16,-40,24,20],
// 4 16 -40 24 20 -36 24 16 -36 24 -16 -40 24 -20
  [4,16,-40,24,20,-36,24,16,-36,24,-16,-40,24,-20],
// 4 16 -40 24 -20 -36 24 -16 36 24 -16 40 24 -20
  [4,16,-40,24,-20,-36,24,-16,36,24,-16,40,24,-20],
// 4 16 40 24 -20 36 24 -16 36 24 16 40 24 20
  [4,16,40,24,-20,36,24,-16,36,24,16,40,24,20],
// 1 16 0 24 0 0 0 40 0 -24 0 -20 0 0 box3u2p.dat
  [1,16,0,24,0,0,0,40,0,-24,0,-20,0,0, ldraw_lib__box3u2p(realsolid)],
// 2 24 -40 24 -20 40 24 -20
  [2,24,-40,24,-20,40,24,-20],
// 2 24 -40 24 20 40 24 20
  [2,24,-40,24,20,40,24,20],
// 1 16 30 0 10 1 0 0 0 1 0 0 0 1 stud.dat
  [1,16,30,0,10,1,0,0,0,1,0,0,0,1, ldraw_lib__stud(realsolid)],
// 1 16 10 0 10 1 0 0 0 1 0 0 0 1 stud.dat
  [1,16,10,0,10,1,0,0,0,1,0,0,0,1, ldraw_lib__stud(realsolid)],
// 1 16 -10 0 10 1 0 0 0 1 0 0 0 1 stud.dat
  [1,16,-10,0,10,1,0,0,0,1,0,0,0,1, ldraw_lib__stud(realsolid)],
// 1 16 -30 0 10 1 0 0 0 1 0 0 0 1 stud.dat
  [1,16,-30,0,10,1,0,0,0,1,0,0,0,1, ldraw_lib__stud(realsolid)],
// 1 16 30 0 -10 1 0 0 0 1 0 0 0 1 stud.dat
  [1,16,30,0,-10,1,0,0,0,1,0,0,0,1, ldraw_lib__stud(realsolid)],
// 1 16 10 0 -10 1 0 0 0 1 0 0 0 1 stud.dat
  [1,16,10,0,-10,1,0,0,0,1,0,0,0,1, ldraw_lib__stud(realsolid)],
// 1 16 -10 0 -10 1 0 0 0 1 0 0 0 1 stud.dat
  [1,16,-10,0,-10,1,0,0,0,1,0,0,0,1, ldraw_lib__stud(realsolid)],
// 1 16 -30 0 -10 1 0 0 0 1 0 0 0 1 stud.dat
  [1,16,-30,0,-10,1,0,0,0,1,0,0,0,1, ldraw_lib__stud(realsolid)],
// 0
];
module ldraw_lib__s__3001s01(step=0, col=false, unit=2/5, alt=false, line=0.2, solid=!$preview)
    makepoly(ldraw_lib__s__3001s01(solid), step=step, col=col, unit=unit, alt=alt, line=line, solid=solid);
ldraw_lib__s__3001s01(line=0.2);
// file: 3001.scad
use <../lib.scad>
use <s/3001s01.scad>
function ldraw_lib__3001() = [
// 0 Brick  2 x  4
// 0 Name: 3001.dat
// 0 Author: James Jessiman
// 0 !LDRAW_ORG Part UPDATE 2004-03
// 0 !LICENSE Licensed under CC BY 2.0 and CC BY 4.0 : see CAreadme.txt
// 
// 0 BFC CERTIFY CCW
  [0,"BFC","CERTIFY"],
  [0,"BFC","CCW"],
// 
// 0 !HISTORY 2002-05-07 {unknown} BFC Certification
// 0 !HISTORY 2002-06-11 [PTadmin] Official Update 2002-03
// 0 !HISTORY 2004-02-08 [Steffen] used s\3001s01.dat
// 0 !HISTORY 2004-09-15 [PTadmin] Official Update 2004-03
// 0 !HISTORY 2007-05-07 [PTadmin] Header formatted for Contributor Agreement
// 0 !HISTORY 2008-07-01 [PTadmin] Official Update 2008-01
// 
// 
// 1 16 0 0 0 1 0 0 0 1 0 0 0 1 s\3001s01.dat
  [1,16,0,0,0,1,0,0,0,1,0,0,0,1, ldraw_lib__s__3001s01()],
// 4 16 -40 0 -20 -40 24 -20 40 24 -20 40 0 -20
  [4,16,-40,0,-20,-40,24,-20,40,24,-20,40,0,-20],
// 4 16 40 0 20 40 24 20 -40 24 20 -40 0 20
  [4,16,40,0,20,40,24,20,-40,24,20,-40,0,20],
// 0
];
module ldraw_lib__3001(step=0, col=false, unit=2/5, alt=false, line=0.2, solid=!$preview)
    makepoly(ldraw_lib__3001(), step=step, col=col, unit=unit, alt=alt, line=line, solid=solid);
ldraw_lib__3001(line=0.2);
// main file
use <../lib.scad>
use <3001.scad>
function ldraw_lib__72841() = [
// 0 =Brick  2 x  4
// 0 Name: 72841.dat
// 0 Author: Massimo Maso [Sirio]
// 0 !LDRAW_ORG Part Alias UPDATE 2025-05
// 0 !LICENSE Licensed under CC BY 4.0 : see CAreadme.txt
// 
// 0 BFC CERTIFY CCW
  [0,"BFC","CERTIFY"],
  [0,"BFC","CCW"],
// 
// 0 !KEYWORDS BrickLink 3001, Rebrickable 3001
// 
// 0 !HISTORY 2025-05-28 [OrionP] Official Update 2025-05
// 
// 1 16 0 0 0 1 0 0 0 1 0 0 0 1 3001.dat
  [1,16,0,0,0,1,0,0,0,1,0,0,0,1, ldraw_lib__3001()],
];
module ldraw_lib__72841(step=0, col=false, unit=2/5, alt=false, line=0.2, solid=!$preview)
    makepoly(ldraw_lib__72841(), step=step, col=col, unit=unit, alt=alt, line=line, solid=solid);
ldraw_lib__72841(line=0.2);
